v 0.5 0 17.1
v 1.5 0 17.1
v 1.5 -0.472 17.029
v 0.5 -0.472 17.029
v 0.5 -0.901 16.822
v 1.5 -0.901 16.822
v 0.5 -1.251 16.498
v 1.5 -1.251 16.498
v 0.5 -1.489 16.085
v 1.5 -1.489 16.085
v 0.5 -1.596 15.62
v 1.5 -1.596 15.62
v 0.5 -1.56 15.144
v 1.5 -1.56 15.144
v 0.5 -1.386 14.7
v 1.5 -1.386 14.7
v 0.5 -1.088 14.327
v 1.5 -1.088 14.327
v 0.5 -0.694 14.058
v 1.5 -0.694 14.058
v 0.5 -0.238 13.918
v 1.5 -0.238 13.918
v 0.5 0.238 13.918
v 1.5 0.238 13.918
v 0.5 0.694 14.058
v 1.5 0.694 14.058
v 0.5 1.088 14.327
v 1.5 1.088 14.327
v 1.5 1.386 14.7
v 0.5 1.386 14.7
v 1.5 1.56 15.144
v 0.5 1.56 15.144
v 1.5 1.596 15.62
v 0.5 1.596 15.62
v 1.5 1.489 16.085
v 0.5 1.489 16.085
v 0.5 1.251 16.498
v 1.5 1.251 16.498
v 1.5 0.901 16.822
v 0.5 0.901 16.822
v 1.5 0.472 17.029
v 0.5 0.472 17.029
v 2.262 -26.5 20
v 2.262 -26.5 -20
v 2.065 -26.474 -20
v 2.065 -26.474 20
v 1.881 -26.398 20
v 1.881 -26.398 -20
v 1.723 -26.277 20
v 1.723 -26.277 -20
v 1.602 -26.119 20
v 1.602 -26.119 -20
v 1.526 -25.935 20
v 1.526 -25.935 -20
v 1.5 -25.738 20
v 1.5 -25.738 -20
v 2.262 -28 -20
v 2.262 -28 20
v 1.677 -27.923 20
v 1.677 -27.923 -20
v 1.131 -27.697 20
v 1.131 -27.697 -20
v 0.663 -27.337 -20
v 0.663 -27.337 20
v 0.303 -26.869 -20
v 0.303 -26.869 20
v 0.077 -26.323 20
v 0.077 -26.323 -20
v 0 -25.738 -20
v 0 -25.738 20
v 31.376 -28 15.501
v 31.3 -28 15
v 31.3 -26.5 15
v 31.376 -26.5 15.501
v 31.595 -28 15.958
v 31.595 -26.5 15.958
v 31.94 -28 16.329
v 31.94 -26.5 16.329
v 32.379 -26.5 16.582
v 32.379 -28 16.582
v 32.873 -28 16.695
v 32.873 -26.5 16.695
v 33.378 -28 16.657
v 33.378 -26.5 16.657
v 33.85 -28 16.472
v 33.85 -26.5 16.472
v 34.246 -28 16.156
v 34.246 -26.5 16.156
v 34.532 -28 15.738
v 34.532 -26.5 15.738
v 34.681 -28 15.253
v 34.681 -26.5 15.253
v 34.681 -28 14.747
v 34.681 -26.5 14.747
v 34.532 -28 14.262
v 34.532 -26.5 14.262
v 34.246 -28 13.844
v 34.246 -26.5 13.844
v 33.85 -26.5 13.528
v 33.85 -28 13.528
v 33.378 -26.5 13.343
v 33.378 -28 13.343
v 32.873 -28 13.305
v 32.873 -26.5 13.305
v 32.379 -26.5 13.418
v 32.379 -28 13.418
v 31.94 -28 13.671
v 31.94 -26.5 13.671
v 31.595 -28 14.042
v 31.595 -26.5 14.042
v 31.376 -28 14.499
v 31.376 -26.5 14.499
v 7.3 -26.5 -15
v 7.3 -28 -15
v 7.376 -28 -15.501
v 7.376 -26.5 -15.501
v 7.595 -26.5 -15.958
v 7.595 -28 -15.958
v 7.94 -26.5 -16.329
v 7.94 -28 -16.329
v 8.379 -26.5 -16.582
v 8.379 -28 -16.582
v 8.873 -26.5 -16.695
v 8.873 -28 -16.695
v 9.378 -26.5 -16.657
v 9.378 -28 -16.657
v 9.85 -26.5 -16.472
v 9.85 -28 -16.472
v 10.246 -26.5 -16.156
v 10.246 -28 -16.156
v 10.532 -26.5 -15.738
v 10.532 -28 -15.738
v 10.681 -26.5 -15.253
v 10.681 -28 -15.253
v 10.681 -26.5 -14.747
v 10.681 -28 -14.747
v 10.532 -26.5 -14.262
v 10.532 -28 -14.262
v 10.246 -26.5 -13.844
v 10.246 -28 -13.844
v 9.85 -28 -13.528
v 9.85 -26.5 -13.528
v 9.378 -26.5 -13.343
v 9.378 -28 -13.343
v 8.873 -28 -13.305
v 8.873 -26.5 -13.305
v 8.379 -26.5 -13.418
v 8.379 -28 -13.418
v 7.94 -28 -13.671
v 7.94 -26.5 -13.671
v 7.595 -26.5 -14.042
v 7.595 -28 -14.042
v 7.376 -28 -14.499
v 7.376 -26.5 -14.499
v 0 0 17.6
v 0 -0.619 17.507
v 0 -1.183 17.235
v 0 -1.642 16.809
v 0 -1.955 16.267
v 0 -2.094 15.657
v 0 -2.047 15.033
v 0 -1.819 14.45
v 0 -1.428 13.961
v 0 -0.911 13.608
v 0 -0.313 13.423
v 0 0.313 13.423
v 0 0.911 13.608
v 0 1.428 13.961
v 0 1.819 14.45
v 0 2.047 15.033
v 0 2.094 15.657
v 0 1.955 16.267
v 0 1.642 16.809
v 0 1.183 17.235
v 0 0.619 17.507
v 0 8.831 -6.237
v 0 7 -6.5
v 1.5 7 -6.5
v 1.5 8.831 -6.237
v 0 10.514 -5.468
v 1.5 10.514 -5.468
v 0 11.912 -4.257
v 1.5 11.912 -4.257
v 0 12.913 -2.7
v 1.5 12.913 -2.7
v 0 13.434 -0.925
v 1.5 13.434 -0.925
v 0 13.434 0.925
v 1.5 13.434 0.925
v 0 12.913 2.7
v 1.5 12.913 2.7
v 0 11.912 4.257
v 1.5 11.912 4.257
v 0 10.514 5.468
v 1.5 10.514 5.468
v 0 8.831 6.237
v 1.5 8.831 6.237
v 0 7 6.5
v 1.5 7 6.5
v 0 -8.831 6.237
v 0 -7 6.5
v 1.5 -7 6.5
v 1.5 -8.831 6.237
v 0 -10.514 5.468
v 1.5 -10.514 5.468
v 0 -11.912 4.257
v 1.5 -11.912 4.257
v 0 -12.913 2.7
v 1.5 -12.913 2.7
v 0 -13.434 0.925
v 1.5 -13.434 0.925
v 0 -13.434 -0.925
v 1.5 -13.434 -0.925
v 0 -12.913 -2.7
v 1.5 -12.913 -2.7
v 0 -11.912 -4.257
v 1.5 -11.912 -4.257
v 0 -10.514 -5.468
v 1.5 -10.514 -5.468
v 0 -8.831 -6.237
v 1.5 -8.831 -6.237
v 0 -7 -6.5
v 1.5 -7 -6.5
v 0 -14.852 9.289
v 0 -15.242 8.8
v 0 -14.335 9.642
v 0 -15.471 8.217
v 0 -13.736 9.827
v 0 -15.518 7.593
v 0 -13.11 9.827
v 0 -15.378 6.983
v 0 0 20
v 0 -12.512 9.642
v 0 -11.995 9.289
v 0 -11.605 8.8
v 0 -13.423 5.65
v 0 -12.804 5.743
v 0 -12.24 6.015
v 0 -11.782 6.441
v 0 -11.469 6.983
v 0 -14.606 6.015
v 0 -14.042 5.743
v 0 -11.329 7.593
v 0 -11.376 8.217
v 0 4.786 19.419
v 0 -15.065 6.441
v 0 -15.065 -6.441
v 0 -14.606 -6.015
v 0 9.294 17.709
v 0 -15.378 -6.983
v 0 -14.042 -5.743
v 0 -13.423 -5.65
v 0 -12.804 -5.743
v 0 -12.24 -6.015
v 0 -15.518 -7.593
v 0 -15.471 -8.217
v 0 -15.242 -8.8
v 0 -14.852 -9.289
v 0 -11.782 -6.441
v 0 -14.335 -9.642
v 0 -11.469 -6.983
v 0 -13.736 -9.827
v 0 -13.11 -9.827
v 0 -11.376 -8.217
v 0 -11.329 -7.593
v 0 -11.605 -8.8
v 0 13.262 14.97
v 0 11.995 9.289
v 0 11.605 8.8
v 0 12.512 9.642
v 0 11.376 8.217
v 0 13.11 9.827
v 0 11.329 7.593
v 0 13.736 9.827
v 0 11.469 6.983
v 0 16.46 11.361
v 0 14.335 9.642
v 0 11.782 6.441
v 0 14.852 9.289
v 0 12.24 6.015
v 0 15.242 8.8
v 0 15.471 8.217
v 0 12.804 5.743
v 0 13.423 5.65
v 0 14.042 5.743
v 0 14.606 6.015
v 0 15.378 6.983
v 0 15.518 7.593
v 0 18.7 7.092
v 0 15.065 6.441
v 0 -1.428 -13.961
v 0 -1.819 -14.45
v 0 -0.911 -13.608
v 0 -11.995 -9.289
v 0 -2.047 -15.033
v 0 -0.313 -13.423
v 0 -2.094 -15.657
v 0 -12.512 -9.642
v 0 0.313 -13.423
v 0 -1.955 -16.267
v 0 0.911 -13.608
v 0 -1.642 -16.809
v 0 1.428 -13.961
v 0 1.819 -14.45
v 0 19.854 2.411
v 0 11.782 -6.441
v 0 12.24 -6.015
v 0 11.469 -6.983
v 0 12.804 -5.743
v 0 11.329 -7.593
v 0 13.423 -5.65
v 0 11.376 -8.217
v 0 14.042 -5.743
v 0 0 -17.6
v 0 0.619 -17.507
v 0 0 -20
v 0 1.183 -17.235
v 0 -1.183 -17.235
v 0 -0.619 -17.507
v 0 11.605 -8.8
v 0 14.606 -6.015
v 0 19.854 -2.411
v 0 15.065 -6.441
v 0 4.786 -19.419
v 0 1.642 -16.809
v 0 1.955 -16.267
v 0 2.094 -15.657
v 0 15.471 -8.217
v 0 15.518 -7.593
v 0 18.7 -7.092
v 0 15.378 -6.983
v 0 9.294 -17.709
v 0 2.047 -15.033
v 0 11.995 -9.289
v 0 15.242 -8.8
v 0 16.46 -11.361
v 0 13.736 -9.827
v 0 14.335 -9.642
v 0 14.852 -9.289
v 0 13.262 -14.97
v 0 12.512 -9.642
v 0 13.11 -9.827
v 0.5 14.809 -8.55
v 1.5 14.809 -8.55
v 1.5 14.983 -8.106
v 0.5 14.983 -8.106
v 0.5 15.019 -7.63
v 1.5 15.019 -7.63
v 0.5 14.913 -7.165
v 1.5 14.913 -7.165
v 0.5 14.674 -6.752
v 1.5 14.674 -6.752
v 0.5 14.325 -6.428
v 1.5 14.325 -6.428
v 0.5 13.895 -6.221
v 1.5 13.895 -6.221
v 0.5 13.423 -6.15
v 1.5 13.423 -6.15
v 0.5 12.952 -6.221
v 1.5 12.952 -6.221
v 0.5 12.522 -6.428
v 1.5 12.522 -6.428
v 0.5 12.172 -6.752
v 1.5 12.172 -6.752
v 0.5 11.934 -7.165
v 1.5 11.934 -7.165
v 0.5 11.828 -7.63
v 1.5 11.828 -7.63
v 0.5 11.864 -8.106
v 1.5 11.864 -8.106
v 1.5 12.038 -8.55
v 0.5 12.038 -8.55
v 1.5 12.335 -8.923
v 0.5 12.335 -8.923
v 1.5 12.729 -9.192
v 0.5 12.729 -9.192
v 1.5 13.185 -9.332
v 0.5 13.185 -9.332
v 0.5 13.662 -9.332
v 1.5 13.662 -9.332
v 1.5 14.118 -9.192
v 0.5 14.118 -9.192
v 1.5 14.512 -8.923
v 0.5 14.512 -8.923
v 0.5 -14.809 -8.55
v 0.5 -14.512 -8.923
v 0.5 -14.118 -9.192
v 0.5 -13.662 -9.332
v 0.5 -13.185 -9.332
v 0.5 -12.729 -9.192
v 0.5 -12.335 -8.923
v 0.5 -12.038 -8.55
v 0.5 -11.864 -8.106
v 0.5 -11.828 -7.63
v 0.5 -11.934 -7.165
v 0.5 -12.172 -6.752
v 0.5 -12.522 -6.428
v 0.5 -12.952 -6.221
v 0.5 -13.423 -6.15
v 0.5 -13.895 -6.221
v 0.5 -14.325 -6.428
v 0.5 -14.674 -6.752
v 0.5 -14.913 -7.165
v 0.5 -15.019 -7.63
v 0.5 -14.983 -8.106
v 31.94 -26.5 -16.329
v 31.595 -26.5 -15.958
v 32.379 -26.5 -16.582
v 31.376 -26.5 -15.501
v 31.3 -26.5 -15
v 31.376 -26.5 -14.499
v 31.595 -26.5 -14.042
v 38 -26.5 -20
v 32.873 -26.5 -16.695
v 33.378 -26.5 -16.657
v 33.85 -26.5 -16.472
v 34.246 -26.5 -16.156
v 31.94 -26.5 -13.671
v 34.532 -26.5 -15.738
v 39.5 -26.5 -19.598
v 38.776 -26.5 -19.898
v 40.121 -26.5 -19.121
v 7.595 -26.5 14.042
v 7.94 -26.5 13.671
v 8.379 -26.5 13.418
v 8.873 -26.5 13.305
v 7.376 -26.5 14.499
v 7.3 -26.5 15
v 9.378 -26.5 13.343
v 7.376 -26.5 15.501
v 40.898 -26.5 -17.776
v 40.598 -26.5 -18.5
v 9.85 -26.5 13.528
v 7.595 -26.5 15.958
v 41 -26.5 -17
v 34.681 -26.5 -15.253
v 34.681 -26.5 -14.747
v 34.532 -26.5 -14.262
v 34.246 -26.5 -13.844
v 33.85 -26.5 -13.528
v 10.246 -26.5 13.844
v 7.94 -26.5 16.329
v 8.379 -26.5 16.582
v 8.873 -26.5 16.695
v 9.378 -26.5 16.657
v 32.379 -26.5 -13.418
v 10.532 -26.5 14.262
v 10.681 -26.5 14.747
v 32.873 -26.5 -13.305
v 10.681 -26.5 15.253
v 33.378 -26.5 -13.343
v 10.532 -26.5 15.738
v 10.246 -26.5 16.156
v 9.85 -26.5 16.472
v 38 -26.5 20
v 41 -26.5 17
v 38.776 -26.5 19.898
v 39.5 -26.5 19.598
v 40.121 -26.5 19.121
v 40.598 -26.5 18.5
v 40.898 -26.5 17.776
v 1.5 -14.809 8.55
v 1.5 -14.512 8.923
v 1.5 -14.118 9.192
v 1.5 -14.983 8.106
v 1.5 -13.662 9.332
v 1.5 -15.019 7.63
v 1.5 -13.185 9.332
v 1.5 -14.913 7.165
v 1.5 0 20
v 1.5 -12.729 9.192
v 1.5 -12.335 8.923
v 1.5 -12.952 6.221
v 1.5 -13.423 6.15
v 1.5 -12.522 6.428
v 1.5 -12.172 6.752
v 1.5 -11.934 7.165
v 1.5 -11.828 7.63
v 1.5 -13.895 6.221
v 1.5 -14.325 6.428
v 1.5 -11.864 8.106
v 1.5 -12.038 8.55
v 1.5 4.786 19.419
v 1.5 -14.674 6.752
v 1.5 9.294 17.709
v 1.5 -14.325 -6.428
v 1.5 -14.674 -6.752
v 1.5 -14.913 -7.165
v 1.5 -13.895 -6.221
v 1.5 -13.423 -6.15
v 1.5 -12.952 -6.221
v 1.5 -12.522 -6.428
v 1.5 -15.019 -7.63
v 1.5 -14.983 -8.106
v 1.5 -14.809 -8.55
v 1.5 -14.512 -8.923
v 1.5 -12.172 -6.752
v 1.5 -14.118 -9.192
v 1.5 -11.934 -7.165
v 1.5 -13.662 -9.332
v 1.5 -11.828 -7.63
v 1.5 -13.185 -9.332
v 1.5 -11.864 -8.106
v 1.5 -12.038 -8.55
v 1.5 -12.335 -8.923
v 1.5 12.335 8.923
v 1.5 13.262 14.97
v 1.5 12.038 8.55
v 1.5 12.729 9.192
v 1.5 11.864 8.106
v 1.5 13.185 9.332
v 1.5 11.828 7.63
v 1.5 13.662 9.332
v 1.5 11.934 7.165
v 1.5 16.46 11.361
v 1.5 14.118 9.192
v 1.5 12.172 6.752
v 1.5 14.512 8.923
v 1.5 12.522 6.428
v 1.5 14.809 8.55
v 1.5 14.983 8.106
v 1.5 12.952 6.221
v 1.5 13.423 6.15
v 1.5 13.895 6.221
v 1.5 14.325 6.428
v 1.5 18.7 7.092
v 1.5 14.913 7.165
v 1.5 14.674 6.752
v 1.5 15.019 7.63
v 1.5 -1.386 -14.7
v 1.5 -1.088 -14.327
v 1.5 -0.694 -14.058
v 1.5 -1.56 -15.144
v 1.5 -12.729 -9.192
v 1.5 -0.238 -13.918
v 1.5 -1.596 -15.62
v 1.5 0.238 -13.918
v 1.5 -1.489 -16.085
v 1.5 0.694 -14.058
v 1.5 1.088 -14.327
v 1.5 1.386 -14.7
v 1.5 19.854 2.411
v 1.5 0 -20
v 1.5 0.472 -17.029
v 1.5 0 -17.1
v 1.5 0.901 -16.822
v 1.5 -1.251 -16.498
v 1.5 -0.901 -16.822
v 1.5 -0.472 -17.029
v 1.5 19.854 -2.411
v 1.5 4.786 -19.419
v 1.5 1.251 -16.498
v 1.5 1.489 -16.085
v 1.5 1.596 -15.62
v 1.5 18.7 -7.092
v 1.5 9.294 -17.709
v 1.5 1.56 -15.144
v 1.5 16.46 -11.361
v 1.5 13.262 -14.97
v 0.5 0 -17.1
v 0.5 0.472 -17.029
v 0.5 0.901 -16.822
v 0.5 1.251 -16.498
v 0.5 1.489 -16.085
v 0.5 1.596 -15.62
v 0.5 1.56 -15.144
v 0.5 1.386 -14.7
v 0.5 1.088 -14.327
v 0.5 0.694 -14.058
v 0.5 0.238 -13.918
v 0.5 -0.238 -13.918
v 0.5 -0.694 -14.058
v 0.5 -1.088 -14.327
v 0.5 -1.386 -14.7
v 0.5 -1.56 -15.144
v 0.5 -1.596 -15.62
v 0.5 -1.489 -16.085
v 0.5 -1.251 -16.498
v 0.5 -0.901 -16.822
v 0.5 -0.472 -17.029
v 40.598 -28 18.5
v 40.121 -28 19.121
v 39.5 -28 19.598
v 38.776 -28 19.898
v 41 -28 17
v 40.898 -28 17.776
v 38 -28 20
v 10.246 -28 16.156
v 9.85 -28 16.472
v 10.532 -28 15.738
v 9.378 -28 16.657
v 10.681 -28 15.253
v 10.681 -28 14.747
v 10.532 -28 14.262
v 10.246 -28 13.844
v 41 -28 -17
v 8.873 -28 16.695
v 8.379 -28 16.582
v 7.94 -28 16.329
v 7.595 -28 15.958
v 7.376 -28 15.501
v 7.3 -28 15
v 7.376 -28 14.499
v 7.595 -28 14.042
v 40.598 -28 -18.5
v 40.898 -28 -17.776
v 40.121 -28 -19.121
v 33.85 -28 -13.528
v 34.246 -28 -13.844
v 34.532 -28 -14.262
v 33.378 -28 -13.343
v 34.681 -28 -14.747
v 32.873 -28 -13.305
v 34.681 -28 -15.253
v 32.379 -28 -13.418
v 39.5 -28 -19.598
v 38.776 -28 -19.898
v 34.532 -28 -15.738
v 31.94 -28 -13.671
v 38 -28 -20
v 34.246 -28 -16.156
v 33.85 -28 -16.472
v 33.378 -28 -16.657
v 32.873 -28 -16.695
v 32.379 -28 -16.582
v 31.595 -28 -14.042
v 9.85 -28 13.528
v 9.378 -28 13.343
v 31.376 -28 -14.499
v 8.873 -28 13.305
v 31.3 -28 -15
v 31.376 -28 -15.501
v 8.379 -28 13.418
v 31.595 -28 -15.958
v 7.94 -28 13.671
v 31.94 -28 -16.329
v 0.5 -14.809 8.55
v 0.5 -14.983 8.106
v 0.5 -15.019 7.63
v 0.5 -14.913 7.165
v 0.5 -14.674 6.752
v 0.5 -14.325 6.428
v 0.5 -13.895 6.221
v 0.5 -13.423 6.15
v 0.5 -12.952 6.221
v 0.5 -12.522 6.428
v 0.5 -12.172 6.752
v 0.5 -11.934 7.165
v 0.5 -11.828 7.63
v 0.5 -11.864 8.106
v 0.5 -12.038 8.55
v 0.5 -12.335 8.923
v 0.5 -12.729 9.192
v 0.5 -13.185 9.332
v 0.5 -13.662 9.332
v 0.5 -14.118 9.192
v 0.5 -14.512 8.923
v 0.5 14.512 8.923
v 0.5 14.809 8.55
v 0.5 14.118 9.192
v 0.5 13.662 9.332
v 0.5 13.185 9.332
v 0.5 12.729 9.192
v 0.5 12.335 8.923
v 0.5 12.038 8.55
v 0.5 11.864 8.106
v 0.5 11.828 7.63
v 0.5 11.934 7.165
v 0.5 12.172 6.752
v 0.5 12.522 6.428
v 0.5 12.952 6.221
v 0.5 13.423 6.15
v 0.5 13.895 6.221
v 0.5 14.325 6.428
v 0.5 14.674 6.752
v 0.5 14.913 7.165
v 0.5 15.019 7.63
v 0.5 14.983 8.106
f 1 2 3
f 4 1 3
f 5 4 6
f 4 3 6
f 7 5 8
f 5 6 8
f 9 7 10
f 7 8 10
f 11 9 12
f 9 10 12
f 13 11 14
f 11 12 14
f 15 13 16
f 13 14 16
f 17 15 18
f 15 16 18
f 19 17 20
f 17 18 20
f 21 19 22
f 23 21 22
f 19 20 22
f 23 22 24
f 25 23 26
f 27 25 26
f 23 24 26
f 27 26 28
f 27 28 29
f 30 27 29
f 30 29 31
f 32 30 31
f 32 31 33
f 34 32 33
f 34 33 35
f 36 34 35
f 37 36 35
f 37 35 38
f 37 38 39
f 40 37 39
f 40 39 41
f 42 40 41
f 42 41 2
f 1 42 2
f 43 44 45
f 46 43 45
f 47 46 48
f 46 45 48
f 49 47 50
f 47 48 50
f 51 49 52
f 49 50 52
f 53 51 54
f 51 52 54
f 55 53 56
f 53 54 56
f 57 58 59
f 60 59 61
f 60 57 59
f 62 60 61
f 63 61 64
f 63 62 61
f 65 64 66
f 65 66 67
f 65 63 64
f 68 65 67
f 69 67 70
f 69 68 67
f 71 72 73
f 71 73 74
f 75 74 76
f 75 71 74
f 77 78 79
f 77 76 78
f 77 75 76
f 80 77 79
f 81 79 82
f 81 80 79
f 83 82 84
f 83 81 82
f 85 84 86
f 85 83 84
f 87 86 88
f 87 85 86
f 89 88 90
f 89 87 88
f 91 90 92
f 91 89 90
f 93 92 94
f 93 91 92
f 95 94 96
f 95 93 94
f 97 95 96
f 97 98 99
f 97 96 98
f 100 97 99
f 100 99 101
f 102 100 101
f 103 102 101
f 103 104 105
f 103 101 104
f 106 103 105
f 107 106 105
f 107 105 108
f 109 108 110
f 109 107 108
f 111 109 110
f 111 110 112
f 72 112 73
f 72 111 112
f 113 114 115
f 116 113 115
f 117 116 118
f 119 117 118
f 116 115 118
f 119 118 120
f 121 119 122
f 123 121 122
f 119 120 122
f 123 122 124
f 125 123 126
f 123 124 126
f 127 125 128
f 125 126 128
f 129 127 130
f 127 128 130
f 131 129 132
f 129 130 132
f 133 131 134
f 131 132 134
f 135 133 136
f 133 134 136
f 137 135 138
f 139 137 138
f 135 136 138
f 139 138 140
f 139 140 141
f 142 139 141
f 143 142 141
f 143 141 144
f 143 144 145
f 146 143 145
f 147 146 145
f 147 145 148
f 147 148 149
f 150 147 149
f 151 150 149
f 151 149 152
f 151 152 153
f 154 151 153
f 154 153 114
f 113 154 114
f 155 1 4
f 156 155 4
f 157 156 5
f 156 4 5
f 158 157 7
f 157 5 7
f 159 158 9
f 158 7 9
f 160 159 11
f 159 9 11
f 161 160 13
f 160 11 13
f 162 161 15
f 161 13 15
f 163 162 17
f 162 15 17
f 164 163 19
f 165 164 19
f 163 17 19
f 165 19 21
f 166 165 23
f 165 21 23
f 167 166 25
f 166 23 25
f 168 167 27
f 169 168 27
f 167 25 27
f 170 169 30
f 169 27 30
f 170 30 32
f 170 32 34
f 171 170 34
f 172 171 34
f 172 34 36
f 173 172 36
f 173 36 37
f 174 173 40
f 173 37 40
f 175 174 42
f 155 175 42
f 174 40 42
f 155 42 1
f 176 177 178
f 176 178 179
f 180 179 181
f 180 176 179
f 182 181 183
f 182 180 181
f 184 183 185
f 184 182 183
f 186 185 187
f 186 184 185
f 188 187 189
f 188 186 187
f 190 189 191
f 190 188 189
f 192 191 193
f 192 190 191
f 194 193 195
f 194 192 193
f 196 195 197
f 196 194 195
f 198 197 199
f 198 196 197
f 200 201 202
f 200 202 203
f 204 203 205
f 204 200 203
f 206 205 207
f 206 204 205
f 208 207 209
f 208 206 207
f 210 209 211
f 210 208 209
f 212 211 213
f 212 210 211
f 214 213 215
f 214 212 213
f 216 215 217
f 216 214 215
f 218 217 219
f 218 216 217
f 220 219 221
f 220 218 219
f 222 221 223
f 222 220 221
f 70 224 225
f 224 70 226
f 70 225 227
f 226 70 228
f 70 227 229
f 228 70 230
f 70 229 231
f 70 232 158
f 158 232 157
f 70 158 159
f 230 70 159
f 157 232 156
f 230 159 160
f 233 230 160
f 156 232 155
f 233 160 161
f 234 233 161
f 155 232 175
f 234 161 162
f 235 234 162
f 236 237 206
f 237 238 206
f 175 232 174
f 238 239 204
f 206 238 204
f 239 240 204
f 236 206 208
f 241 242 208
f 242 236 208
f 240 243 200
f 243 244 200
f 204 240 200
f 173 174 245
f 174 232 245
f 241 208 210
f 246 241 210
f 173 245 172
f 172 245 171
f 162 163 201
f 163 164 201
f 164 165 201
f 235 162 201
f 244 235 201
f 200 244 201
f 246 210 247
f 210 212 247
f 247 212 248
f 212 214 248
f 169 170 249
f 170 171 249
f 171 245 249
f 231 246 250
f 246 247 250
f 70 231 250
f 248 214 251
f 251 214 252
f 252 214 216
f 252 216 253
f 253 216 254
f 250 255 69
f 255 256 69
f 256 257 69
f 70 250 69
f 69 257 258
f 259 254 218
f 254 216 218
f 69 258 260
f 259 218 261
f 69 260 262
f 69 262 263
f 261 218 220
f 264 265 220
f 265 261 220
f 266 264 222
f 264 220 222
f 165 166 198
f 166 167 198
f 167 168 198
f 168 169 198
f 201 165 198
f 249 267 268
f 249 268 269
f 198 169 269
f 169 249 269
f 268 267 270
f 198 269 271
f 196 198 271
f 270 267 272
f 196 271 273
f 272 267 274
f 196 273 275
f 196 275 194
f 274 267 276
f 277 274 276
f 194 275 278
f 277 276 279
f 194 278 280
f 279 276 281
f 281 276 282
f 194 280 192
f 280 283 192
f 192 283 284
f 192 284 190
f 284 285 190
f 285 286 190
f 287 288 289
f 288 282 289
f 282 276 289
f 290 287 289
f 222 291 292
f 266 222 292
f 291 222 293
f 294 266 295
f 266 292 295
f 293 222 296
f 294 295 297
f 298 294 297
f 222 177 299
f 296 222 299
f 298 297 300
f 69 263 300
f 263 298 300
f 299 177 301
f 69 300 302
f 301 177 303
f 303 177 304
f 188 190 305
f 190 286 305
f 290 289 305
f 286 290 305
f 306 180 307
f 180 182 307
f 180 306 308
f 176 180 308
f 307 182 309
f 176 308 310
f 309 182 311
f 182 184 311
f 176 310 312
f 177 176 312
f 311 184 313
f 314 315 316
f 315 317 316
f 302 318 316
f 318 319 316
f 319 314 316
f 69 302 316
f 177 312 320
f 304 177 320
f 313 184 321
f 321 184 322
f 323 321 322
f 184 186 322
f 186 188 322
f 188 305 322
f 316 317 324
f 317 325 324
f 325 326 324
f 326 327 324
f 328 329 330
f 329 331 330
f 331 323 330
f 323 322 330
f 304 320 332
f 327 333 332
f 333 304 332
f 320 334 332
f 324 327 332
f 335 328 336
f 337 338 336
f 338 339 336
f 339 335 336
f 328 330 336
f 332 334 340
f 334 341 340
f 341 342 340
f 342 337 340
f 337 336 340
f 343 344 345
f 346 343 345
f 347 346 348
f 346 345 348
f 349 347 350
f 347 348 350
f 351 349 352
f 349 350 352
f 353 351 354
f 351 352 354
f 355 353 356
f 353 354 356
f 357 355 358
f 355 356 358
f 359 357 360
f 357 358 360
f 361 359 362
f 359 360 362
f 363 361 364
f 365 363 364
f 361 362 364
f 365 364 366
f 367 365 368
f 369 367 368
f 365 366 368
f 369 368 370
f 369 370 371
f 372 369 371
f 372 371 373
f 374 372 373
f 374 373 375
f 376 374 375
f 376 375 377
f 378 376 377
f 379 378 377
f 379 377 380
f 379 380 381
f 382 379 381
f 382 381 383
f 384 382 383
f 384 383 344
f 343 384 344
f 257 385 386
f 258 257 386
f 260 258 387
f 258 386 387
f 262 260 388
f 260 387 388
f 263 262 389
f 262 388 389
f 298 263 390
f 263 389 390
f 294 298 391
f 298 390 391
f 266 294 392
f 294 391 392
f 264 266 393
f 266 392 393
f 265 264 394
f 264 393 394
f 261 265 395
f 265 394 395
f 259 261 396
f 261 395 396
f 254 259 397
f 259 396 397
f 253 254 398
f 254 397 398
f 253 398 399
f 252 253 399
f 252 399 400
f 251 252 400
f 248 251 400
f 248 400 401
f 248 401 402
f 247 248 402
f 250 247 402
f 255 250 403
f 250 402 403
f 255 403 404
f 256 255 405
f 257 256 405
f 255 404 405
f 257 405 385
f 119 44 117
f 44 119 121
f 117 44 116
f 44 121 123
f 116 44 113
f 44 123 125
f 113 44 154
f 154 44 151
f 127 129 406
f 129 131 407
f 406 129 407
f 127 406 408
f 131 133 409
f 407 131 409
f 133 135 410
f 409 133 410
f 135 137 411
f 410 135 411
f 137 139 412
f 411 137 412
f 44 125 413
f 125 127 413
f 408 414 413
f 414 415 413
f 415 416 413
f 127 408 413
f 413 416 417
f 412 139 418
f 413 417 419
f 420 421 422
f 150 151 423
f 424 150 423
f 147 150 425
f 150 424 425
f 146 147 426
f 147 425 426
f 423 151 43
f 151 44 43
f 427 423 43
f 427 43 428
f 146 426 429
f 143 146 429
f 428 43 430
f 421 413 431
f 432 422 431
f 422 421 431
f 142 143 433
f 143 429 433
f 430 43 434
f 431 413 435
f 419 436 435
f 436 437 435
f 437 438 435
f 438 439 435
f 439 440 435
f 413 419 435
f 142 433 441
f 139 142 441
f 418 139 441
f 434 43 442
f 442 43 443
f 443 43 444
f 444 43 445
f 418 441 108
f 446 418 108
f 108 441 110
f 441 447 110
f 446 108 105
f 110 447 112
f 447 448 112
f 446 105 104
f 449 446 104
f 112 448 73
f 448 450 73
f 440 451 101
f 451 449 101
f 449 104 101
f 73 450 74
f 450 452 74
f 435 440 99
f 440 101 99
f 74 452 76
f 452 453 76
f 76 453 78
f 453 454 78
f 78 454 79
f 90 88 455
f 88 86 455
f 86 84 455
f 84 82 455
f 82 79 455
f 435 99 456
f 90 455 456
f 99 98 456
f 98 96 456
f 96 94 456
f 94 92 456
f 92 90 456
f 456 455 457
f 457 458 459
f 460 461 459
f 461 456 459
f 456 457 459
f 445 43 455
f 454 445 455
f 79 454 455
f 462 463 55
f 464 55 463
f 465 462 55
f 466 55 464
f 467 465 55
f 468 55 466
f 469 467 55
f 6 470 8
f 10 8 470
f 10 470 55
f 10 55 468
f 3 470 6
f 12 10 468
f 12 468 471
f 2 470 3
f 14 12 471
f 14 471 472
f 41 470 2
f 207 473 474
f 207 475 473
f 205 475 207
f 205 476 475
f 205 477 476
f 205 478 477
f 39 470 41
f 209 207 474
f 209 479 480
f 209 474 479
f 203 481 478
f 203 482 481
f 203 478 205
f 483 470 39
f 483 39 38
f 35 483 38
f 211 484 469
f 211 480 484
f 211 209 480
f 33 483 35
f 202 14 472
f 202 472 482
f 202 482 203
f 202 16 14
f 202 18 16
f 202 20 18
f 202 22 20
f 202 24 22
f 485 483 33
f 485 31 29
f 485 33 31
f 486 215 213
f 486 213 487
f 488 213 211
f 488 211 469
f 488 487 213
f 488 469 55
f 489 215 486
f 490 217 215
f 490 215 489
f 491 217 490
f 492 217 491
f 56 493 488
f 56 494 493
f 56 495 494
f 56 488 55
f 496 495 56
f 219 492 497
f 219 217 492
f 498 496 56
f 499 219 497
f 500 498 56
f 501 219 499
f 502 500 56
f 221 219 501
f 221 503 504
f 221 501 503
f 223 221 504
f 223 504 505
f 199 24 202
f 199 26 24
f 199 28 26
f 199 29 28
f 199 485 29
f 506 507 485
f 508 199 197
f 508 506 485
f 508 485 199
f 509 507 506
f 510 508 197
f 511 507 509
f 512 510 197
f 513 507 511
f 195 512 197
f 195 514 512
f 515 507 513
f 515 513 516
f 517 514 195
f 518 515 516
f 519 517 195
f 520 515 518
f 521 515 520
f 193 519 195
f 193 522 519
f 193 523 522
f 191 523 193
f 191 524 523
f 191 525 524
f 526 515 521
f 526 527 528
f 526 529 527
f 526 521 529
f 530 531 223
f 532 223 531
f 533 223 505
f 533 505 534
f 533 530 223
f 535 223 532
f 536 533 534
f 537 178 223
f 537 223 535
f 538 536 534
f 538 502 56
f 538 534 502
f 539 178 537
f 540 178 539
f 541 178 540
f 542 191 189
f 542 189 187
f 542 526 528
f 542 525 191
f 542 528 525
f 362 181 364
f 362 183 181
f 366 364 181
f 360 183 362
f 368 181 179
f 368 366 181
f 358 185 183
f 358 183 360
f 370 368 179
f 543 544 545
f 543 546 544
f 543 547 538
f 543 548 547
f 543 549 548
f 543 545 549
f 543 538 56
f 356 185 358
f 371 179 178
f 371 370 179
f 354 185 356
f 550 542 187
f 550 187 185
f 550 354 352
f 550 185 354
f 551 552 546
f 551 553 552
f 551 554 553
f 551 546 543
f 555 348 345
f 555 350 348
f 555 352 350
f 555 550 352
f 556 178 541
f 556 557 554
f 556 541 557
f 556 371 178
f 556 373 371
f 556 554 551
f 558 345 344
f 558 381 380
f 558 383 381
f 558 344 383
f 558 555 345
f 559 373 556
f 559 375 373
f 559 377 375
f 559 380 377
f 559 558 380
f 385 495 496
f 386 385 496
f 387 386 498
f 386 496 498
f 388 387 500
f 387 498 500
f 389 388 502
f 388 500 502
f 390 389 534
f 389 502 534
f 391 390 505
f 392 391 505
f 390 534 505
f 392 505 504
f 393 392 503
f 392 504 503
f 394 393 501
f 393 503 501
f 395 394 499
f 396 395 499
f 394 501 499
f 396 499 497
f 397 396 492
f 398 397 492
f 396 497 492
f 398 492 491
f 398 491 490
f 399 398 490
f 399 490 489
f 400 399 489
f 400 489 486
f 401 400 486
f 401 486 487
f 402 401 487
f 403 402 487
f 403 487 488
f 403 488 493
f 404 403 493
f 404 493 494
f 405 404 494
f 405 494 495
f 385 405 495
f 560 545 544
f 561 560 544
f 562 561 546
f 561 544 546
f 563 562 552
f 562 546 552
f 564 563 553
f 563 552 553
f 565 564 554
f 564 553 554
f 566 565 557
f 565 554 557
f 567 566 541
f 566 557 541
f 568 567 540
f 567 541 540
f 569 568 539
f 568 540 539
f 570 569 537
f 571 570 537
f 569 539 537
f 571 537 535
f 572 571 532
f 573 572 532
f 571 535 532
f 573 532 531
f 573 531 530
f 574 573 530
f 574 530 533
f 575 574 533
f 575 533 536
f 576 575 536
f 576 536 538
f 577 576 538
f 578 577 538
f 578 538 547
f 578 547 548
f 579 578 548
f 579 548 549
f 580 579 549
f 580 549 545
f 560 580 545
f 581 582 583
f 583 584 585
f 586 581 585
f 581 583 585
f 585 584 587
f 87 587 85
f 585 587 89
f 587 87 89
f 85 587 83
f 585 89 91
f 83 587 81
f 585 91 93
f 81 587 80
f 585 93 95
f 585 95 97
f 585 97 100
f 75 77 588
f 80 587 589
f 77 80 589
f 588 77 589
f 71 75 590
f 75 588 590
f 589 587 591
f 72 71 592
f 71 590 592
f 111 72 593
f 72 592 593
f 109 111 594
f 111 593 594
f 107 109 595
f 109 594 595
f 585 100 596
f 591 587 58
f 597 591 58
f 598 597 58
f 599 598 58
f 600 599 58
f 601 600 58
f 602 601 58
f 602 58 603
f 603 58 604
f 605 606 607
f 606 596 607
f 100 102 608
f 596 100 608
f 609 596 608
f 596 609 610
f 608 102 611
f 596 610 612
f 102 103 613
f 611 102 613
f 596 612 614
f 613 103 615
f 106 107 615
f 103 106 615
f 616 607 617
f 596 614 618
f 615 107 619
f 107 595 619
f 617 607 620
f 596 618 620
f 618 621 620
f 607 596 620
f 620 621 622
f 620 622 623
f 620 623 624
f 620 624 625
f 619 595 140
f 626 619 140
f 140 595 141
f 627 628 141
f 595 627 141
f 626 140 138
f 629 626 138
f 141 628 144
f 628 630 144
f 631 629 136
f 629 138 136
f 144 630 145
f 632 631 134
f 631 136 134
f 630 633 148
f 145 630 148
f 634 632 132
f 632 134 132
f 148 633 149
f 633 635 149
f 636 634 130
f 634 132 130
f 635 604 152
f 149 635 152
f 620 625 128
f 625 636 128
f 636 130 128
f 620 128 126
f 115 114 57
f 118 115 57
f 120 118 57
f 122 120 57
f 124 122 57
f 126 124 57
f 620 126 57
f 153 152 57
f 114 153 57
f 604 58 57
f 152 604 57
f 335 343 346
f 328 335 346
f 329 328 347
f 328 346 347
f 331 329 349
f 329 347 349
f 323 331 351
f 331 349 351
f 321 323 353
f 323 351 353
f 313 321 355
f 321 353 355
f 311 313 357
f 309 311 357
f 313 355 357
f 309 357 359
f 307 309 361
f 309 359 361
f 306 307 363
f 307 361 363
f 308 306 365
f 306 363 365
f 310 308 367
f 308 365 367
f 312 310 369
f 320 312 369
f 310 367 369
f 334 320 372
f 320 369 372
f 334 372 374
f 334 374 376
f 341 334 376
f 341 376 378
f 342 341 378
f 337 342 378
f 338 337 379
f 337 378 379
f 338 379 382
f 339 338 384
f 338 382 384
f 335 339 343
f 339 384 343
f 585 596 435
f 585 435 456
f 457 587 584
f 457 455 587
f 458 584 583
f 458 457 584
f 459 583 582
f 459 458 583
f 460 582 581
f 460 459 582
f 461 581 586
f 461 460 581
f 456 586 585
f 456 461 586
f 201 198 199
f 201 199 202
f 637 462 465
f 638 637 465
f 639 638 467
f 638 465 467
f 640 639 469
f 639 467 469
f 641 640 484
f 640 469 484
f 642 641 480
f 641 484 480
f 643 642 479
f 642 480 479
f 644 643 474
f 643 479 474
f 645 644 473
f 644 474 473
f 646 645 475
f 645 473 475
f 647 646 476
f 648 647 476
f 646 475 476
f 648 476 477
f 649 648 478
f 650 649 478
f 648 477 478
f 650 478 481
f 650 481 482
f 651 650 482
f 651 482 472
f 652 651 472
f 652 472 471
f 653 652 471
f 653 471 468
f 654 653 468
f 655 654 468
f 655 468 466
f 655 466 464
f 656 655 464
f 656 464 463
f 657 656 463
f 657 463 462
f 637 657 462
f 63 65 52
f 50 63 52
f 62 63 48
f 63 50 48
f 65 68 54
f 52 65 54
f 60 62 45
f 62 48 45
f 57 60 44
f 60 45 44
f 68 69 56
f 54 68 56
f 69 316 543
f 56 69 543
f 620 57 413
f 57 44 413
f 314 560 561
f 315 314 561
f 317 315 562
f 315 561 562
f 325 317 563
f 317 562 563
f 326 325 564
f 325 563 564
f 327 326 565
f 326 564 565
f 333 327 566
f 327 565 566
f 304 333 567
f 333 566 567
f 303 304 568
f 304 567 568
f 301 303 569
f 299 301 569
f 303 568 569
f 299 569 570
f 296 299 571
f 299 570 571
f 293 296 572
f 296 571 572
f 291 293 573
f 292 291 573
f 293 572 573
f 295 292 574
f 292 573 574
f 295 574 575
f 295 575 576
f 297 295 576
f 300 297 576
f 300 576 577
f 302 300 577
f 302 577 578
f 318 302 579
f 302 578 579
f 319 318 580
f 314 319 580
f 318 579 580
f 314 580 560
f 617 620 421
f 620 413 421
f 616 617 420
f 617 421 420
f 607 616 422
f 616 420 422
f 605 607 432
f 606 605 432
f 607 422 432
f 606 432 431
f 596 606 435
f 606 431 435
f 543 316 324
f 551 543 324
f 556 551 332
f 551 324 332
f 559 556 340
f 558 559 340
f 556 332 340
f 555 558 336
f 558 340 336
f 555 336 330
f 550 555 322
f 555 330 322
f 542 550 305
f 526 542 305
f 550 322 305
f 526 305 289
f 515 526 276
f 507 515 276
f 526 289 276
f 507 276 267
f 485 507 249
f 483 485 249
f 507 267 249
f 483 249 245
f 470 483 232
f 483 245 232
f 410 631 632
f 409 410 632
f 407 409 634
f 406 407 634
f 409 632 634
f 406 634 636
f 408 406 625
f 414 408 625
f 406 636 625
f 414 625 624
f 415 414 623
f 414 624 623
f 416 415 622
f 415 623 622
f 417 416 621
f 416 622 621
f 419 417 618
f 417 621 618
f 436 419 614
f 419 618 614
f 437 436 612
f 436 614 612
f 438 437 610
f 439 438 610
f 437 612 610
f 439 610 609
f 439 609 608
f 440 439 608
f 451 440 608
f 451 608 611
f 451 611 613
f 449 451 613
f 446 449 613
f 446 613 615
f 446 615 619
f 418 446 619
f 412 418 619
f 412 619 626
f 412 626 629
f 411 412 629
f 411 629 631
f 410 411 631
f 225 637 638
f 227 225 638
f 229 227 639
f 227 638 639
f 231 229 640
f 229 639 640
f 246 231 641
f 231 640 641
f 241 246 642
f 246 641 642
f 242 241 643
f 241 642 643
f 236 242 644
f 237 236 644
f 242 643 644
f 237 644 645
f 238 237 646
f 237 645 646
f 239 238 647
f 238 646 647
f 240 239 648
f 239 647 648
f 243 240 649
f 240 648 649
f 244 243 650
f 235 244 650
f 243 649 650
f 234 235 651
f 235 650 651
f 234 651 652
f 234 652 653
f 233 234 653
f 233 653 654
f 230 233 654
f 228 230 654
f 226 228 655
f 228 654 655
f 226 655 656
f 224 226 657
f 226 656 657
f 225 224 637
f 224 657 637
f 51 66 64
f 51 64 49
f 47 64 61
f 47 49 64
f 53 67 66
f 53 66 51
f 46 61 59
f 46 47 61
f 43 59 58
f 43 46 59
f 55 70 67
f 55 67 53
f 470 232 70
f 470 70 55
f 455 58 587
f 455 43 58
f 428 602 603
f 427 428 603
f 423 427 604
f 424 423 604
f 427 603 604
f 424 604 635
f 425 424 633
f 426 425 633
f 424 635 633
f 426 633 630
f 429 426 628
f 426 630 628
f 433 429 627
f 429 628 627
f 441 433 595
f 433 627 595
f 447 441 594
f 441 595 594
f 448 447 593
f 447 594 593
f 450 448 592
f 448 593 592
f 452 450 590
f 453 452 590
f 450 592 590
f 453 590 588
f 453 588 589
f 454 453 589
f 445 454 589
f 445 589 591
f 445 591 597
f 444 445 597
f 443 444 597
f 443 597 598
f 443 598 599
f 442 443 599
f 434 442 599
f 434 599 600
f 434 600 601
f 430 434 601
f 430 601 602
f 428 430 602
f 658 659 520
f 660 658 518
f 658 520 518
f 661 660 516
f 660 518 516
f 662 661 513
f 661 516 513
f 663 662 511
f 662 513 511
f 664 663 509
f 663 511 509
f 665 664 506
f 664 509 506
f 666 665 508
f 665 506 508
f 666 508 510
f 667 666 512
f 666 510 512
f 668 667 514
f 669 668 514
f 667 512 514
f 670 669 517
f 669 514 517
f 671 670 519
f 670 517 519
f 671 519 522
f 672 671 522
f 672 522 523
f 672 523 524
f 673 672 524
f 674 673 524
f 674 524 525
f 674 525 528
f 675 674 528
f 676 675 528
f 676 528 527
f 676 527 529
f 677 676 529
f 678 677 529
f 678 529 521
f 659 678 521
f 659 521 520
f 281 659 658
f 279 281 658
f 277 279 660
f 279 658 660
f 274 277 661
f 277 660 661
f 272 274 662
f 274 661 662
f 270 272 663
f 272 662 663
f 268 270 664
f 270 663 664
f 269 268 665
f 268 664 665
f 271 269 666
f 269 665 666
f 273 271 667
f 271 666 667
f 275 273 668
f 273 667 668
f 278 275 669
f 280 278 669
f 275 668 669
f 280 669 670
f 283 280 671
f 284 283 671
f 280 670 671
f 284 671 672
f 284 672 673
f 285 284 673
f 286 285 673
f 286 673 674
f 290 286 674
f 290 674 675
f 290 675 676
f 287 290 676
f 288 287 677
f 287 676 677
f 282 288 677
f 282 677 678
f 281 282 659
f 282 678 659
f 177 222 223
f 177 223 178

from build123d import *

# Parameters (mm, degrees)
BOSS_EXTRUDE1_DEPTH    = 1.5
SKETCH2_W              = 41
SKETCH2_H              = 40
BOSS_EXTRUDE2_DEPTH    = 1.5
CONVERT_SOLID1_START   = -20
CONVERT_SOLID1_DEPTH   = 40
CONVERT_SOLID1_2_DEPTH = 40
M3_CLEARANCE_HOLE1_D   = 3.2
CIRPATTERN1_COUNT      = 6
CUT_EXTRUDE1_DEPTH     = 54.525694764
M3_CLEARANCE_HOLE2_D   = 3.4
LPATTERN1_COUNT        = 2
LPATTERN1_PITCH        = 24
LPATTERN1_COPY_1_D     = 3.4
FILLET1_R              = 3
CHAMFER1_SIZE          = 0.5
CHAMFER2_SIZE          = 0.5


# Read off the part's stored shape, not the designer's step: Convert-Solid1
with BuildPart() as part:
    # Sketch1 → Boss-Extrude1 (new body)
    with BuildSketch(Plane(origin=(0, 0, 0), x_dir=(0, 0, -1), z_dir=(1, 0, 0))):
        with BuildLine():
            Line((-20, 0), (-20, -28))
            Line((-20, -28), (20, -28))
            Line((20, -28), (20, 0))
            ThreePointArc((20, 0), (0, 20), (-20, 0))
        make_face()
    extrude(amount=BOSS_EXTRUDE1_DEPTH)

    # Sketch2 → Boss-Extrude2 (add)
    with BuildSketch(Plane.XZ.offset(28)):
        with Locations((20.5, 0)):
            Rectangle(SKETCH2_W, SKETCH2_H)
    extrude(amount=-BOSS_EXTRUDE2_DEPTH)

    # Convert-Solid1 outline → Convert-Solid1 (cut)
    with BuildSketch(Plane.XY.offset(CONVERT_SOLID1_START)):
        with BuildLine():
            Line((0, -28), (2.262, -28))
            ThreePointArc((2.262, -28), (0.662524461, -27.337475539), (0, -25.738))
            Line((0, -25.738), (0, -28))
        make_face()
    extrude(amount=CONVERT_SOLID1_DEPTH, mode=Mode.SUBTRACT)

    # Convert-Solid1 2 outline → Convert-Solid1 2 (add)
    with BuildSketch(Plane.XY.offset(CONVERT_SOLID1_START)):
        with BuildLine():
            Line((1.5, -26.5), (2.262, -26.5))
            ThreePointArc((2.262, -26.5), (1.723184633, -26.276815367), (1.5, -25.738))
            Line((1.5, -25.738), (1.5, -26.5))
        make_face()
    extrude(amount=CONVERT_SOLID1_2_DEPTH)

    # M3 Clearance Hole1 (through all)
    with Locations(Plane.ZY):
        with Locations((-15.5, 0)):
            m3_clearance_hole1 = Hole(M3_CLEARANCE_HOLE1_D / 2)

    # CirPattern1: M3 Clearance Hole1 ×6 about axis
    cirpattern1_axis = Axis((0, 0, 0), (1, 0, 0))
    for i in range(1, CIRPATTERN1_COUNT):
        add(m3_clearance_hole1.rotate(cirpattern1_axis, i * 360 / CIRPATTERN1_COUNT), mode=Mode.SUBTRACT)

    # Sketch9 → Cut-Extrude1 (cut, through all)
    with BuildSketch(Plane.ZY):
        with BuildLine():
            Line((6.5, 7), (6.5, -7))
            ThreePointArc((6.5, -7), (0, -13.5), (-6.5, -7))
            Line((-6.5, -7), (-6.5, 7))
            ThreePointArc((-6.5, 7), (0, 13.5), (6.5, 7))
        make_face()
    extrude(amount=-CUT_EXTRUDE1_DEPTH, mode=Mode.SUBTRACT)

    # M3 Clearance Hole2 (through all)
    with Locations(Plane(origin=(0, -26.5, 0), x_dir=(1, 0, 0), z_dir=(0, 1, 0))):
        with Locations((33, 15)):
            m3_clearance_hole2 = Hole(M3_CLEARANCE_HOLE2_D / 2)

    # Mirror1: M3 Clearance Hole2 across plane
    add(m3_clearance_hole2.mirror(Plane.XY), mode=Mode.SUBTRACT)

    # LPattern1: M3 Clearance Hole2 ×2
    with Locations(*[(-i * LPATTERN1_PITCH, 0, 0) for i in range(1, LPATTERN1_COUNT)]):
        add(m3_clearance_hole2, mode=Mode.SUBTRACT)

    # LPattern1 copy 1 (through all)
    with Locations(Plane(origin=(-24, -26.5, 0), x_dir=(1, 0, 0), z_dir=(0, 1, 0))):
        with Locations((33, -15)):
            Hole(LPATTERN1_COPY_1_D / 2)

    # Fillet1
    fillet1_edges = [part.edges().sort_by_distance(p)[0] for p in [
        (41, -27.25, 20),
        (41, -27.25, -20),
    ]]
    fillet(fillet1_edges, radius=FILLET1_R)

    # Chamfer1
    chamfer1_edges = [part.edges().sort_by_distance(p)[0] for p in [
        (0, 12.037753113, -6.95),
    ]]
    chamfer(chamfer1_edges, length=CHAMFER1_SIZE)

    # Chamfer2
    chamfer2_edges = [part.edges().sort_by_distance(p)[0] for p in [
        (0, 0, -13.9),
        (0, 12.037753113, 6.95),
        (0, 0, 13.9),
        (0, -12.037753113, 6.95),
        (0, -12.037753113, -6.95),
    ]]
    chamfer(chamfer2_edges, length=CHAMFER2_SIZE)


solid = part.part
